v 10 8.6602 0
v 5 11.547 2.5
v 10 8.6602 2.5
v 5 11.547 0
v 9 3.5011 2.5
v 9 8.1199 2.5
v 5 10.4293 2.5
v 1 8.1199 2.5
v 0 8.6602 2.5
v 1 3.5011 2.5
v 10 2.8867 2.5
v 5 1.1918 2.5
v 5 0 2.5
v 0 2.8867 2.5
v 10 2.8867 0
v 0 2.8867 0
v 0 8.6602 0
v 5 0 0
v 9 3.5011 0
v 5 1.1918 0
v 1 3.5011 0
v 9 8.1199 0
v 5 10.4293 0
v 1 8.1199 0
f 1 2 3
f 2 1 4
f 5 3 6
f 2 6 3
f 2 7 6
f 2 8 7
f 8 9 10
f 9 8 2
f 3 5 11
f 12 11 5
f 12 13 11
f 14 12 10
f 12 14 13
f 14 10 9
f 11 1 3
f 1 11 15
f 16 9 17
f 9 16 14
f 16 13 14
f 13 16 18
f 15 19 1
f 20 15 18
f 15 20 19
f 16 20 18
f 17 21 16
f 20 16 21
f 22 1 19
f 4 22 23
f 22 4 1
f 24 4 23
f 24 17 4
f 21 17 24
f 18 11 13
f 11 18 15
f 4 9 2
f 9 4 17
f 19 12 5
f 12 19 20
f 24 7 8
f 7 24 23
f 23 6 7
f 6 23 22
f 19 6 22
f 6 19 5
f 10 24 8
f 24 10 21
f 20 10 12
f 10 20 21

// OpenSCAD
// file: rpz2w_no_cut.scad
//include <../common.scad>

$fn = 64;
eps = 0.5;
tol = 0.1;
nof = 0.001;

// Parameters for Raspberry Pi Zero 2 W
rpz_cr =  3;                     // corner radius
rpz_l  =  65 + (2 * tol);        // length
rpz_w  =  30 + (2 * tol);        // width
rpz_hr =  2.75 / 2;              // hole radius
rpz_ho =  3.5;                   // hole offset

// Parameters for Case
case_ph = 4.5;                   // through-pin height
case_pr = rpz_hr - tol;          // through-pin radius
case_co = 6.5;                   // pin cutout offset
case_cl = 52;                    // pin cutout length
case_cd = 7;                     // pin cutout depth
case_t  = 1;                     // thickness
case_h  = 4.5;                   // case height
pci_o   = 6;                     // offset of pci slot
pci_l   = rpz_w - (2 * pci_o);   // width of pci slot
hdmi_o  = 6.4;                   // mini HDMI offset
hdmi_w  = 12.5;                  // mini HDMI width
usb1_o  = 37.1;                  // micro USB 2 offset
usb2_o  = 49.95;                 // micro USB 2 offset
usb_w   = 8.5;                   // micro USB cutout width
sd_o    = 6.5;                   // 
sd_w    = 13;                    // 
top_h   = 2*(case_h/3);          //


module donut(inner_radius, body_radius) {
    rotate_extrude(convexity=10)
    translate([inner_radius,0,0])
    circle(r=body_radius);
}

// cuboid with chamfored edges on the bottom
module bottom_rrect(radius, width, length, height, bradius) {
    // Vertical columns
    for (i = [radius, length - radius]) {
        for (j = [radius, width - radius]) {
            translate([i,j,bradius])
            cylinder(r=radius, h=height-bradius);
        }
    }
    // Things
    translate([radius,bradius,bradius])
    rotate([0,90,0])
    cylinder(r=bradius, h=length-(2*radius));
    translate([radius,width-bradius,bradius])
    rotate([0,90,0])
    cylinder(r=bradius, h=length-(2*radius));
    // Stuff
    rotate([90,0,0])
    translate([bradius,bradius,-width+radius])
    cylinder(r=bradius, h=width-(2*radius));
    rotate([90,0,0])
    translate([length-bradius,bradius,-width+radius])
    cylinder(r=bradius, h=width-(2*radius));
    
    for (i = [radius, length - radius]) {
        for (j = [radius, width - radius]) {
            translate([i, j, bradius])
            donut(radius-bradius, bradius);
            translate([i, j, 0])
            cylinder(r=radius-bradius, h=bradius);
        }
    }
    
    // "upper" filler cubes
    translate([radius,0,bradius])
    cube([length-(2*radius),width,height-bradius]);
    translate([0,radius,bradius])
    cube([length,width-(2*radius),height-bradius]);
    
    // "Lower" filler cubes
    translate([radius,bradius,0])
    cube([length-(2*radius),width-(2*bradius),bradius]);
    translate([bradius,radius,0])
    cube([length-(2*bradius),width-(2*radius),bradius]);
}

// cuboid where corners on one axis are rounded
module rrect(radius, length, width, height, vert=false) {
    // width is x-axis, length is y-axis
    w_space = width - (2 * radius);
    l_space = length - (2  * radius);
    for (i = [0, w_space]) {
        for (j = [0, l_space]) {
            translate([i+radius,j+radius,0])
            cylinder(height, radius, radius);
        }
    }
    translate([radius,0,0])
    cube([w_space,length,height]);
    translate([0,radius,0])
    cube([width,l_space,height]);
}


module wall(thck, in_rad, hght, lngth, wdth) {
    doub = thck * 2;
    difference() {
        bottom_rrect(in_rad + thck, lngth + doub, wdth + doub, hght,1);
        translate([thck, thck, -(eps / 2)+1.25])
        rrect(in_rad, lngth, wdth, hght + 1 + eps);
    }
}

// Parameters:
module case_btm_pos(
                br=rpz_cr, bl=rpz_l, bw=rpz_w, 
                bh=case_t, hr=rpz_hr, ho=rpz_ho, 
                pr=case_pr, ph=case_ph, ch=case_h
            ) {
    translate([bh, bh, 0]) {
        // adding the pins through pins
        for (i = [0 + ho + tol, bw - ho - tol]) {
            for (j = [0 + ho + tol, bl - ho - tol]) {
                translate([i, j, bh])
                cylinder(ph+top_h-bh + tol, pr, pr);
            }
        }
    }
    
    wall(bh, br, ch, bl, bw);
}

// Parameters: 
module case_btm_neg(
                co=case_co, cl=case_cl,cd=case_cd, 
                bh=case_t, ch=case_h
            ) {
    translate([pci_o + bh, rpz_l, bh + nof])
    cube([pci_l,10,10]);
    translate([sd_o + bh, -eps, bh + nof])
    cube([sd_w,10,10]);
    translate([5,hdmi_o + bh,bh + nof])
    cube([rpz_w,hdmi_w,5]);
    translate([5,usb1_o + bh,bh + nof])
    cube([rpz_w,usb_w,5]);
    translate([5,usb2_o + bh,bh + nof])
    cube([rpz_w,usb_w,5]);
}

module case_btm() {
    difference() {
        case_btm_pos();
        case_btm_neg();
    }
}

module case_top() {
    basis = case_t + rpz_l;
    difference() {
        wall(case_t, rpz_cr, top_h, rpz_l, rpz_w);
        translate([case_t, case_t, 0]) {
            // adding the pins through pins
            for (i = [rpz_ho+tol,rpz_w-rpz_ho-tol]) {
                for (j = [rpz_ho+tol,rpz_l-rpz_ho-tol]) {
                    translate([i, j, -nof])
                    cylinder(case_ph, case_pr+0.1, case_pr+0.1);
                }
            }
        }
        translate([5,basis - hdmi_o - hdmi_w,case_t + nof])
        cube([rpz_w,hdmi_w,5]);
        translate([5,basis - usb1_o - usb_w,case_t + nof])
        cube([rpz_w,usb_w,5]);
        translate([5,basis - usb2_o - usb_w,case_t + nof])
        cube([rpz_w,usb_w,5]);
    }
}

color("#44ff5a")
case_btm();
color("green")
translate([35, 0, 0])
case_top();
// file: ../common.scad
$fn=50;

module donut(inner_radius, body_radius) {
    rotate_extrude(convexity=10)
    translate([inner_radius,0,0])
    circle(r=body_radius);
}

// helper module for making sets of columns
module four_cols(v1, v2, rots, t, r, h) {
    for (i = v1, j = v2) {
        rotate(rots)
        translate([i, j, t])
        cylinder(r = r, h = h);
    }
}

// cuboid with filleted edges on the bottom
module bottom_rrect(radius, width, length, height, bradius) {
    // Vertical columns
    for (i = [radius, length - radius]) {
        for (j = [radius, width - radius]) {
            translate([i, j, bradius])
            cylinder(r=radius, h=height-bradius);
            
            translate([i, j, bradius])
            donut(radius-bradius, bradius);
            
            translate([i, j, 0])
            cylinder(r=radius-bradius, h=bradius);
        }
    }

    // x-axis cylinders
    four_cols([-bradius], [bradius, width-bradius], [0,90,0], radius, bradius, length-(2*radius));
    
    // y-axis cylinders
    color("red")
    four_cols([length, bradius], [bradius],[90,0,0], radius, bradius, -width + radius);
    four_cols([bradius, length - bradius], [bradius], [90,0,0], -width + radius, bradius, width - (2 * radius));
   
    // top fill cuboids
    translate([radius,0,bradius])
    cube([length-(2*radius), width, height-bradius]);
    translate([0,radius,bradius])
    cube([length, width-(2*radius), height-bradius]);
    
    // bottom fill cuboids
    translate([radius,bradius,0])
    cube([length-(2*radius), width-(2*bradius), bradius]);
    translate([bradius,radius,0])
    cube([length-(2*bradius), width-(2*radius), bradius]);
}

// cuboid where corners on one axis are rounded
module rrect(radius, length, width, height, vert=false) {
    // width is x-axis, length is y-axis
    w_space = width - (2 * radius);
    l_space = length - (2  * radius);
    for (i = [0, w_space], j = [0, l_space]) {
        translate([i+radius, j+radius, 0])
        cylinder(height, radius, radius);
    }
    translate([radius, 0, 0])
    cube([w_space, length, height]);
    translate([0,radius, 0])
    cube([width, l_space, height]);
}


// cuboid that is fully rounded all around
module full_rrect(radius, length, width, height) {
    translate([radius, radius, radius]) {
        four_cols([0, length], [0, width], [0, 0, 0], 0, radius, height);
        four_cols([0, -height],[0, width],[0, 90, 0], 0, radius, length);
        four_cols([0, length],[0, height],[90, 0, 0],-width,radius,width);
    
        for (i = [0, length], j = [0, width], k = [0, height]) {
            translate([i, j, k])
            sphere(radius);
        }
        
        translate([0,0,-radius])
        cube([length, width, height+(2*radius)]);
        translate([0,-radius,0])
        cube([length, width+(2*radius), height]);
        translate([-radius,0,0])
        cube([length+(2*radius), width, height]);
    }
}

bottom_rrect(3, 36, 24, 2, 1);
// main file
use <../common.scad>
use <rpz2w_no_cut.scad> 

$fn = 64;
eps = 0.5;
tol = 0.1;
nof = 0.001;

// Parameters for Raspberry Pi Zero 2 W
rpz_cr =  3;                     // corner radius
rpz_l  =  65 + (2 * tol);        // length
rpz_w  =  30 + (2 * tol);        // width
rpz_hr =  2.75 / 2;              // hole radius
rpz_ho =  3.5;                   // hole offset

// Parameters for Case
case_ph = 4.5;                   // through-pin height
case_pr = rpz_hr - tol;          // through-pin radius
case_co = 6.5;                   // pin cutout offset
case_cl = 52;                    // pin cutout length
case_cd = 7;                     // pin cutout depth
case_t  = 1;                     // thickness
case_h  = 4.5;                   // case height
pci_o   = 6;                     // offset of pci slot
pci_l   = rpz_w - (2 * pci_o);   // width of pci slot
hdmi_o  = 6.4;                   // mini HDMI offset
hdmi_w  = 12.5;                  // mini HDMI width
usb1_o  = 37.1;                  // micro USB 2 offset
usb2_o  = 49.95;                 // micro USB 2 offset
usb_w   = 8.5;                   // micro USB cutout width
sd_o    = 6.5;                   // 
sd_w    = 13;                    // 
top_h   = 2*(case_h/3);          //

bot_of_top = 35 + rpz_ho + tol + case_t + rpz_hr + 1;
top_of_bot = 35 + rpz_w + case_t - rpz_ho - rpz_hr - 1;
hole_right = case_t + rpz_ho + rpz_hr + 1;
hole_left  = 0;

module hexadron(tall, height) {
    wide   = tall / tan(60);
    radius = sqrt((tall ^ 2) + (wide ^ 2));
    linear_extrude(height) {
        polygon(
            [[tall, 0], [2 * tall, wide], [2 * tall, wide + radius],
            [tall, (2 * wide) + radius], [0, wide + radius],[0, wide]]
        );
    }
}

module hex_tile(tall, height, width) {
    // we want 
    // opp / adj = tan(60)
    // 2x^2 = 1
    del = width * tan(50);
    echo(tan(50));
    difference() {
        hexadron(tall, height);
        translate([width, del, -nof])
        hexadron(tall-width, height + (2 * nof));
    }
}

module protected() {
}

//color("red")
//translate([bot_of_top, case_t, 0])
//cube([top_of_bot -  bot_of_top, hole_right - case_t, 2]);
//color("purple")
//translate([bot_of_top, hole_right, 0])
//cube([top_of_bot -  bot_of_top, hole_right - case_t, 2]);

//color("#44ff5a")
//case_btm();

//color("greenyellow")
//translate([35, 0, 0])
//case_top();

hex_tile(5, 2.5, 1);
